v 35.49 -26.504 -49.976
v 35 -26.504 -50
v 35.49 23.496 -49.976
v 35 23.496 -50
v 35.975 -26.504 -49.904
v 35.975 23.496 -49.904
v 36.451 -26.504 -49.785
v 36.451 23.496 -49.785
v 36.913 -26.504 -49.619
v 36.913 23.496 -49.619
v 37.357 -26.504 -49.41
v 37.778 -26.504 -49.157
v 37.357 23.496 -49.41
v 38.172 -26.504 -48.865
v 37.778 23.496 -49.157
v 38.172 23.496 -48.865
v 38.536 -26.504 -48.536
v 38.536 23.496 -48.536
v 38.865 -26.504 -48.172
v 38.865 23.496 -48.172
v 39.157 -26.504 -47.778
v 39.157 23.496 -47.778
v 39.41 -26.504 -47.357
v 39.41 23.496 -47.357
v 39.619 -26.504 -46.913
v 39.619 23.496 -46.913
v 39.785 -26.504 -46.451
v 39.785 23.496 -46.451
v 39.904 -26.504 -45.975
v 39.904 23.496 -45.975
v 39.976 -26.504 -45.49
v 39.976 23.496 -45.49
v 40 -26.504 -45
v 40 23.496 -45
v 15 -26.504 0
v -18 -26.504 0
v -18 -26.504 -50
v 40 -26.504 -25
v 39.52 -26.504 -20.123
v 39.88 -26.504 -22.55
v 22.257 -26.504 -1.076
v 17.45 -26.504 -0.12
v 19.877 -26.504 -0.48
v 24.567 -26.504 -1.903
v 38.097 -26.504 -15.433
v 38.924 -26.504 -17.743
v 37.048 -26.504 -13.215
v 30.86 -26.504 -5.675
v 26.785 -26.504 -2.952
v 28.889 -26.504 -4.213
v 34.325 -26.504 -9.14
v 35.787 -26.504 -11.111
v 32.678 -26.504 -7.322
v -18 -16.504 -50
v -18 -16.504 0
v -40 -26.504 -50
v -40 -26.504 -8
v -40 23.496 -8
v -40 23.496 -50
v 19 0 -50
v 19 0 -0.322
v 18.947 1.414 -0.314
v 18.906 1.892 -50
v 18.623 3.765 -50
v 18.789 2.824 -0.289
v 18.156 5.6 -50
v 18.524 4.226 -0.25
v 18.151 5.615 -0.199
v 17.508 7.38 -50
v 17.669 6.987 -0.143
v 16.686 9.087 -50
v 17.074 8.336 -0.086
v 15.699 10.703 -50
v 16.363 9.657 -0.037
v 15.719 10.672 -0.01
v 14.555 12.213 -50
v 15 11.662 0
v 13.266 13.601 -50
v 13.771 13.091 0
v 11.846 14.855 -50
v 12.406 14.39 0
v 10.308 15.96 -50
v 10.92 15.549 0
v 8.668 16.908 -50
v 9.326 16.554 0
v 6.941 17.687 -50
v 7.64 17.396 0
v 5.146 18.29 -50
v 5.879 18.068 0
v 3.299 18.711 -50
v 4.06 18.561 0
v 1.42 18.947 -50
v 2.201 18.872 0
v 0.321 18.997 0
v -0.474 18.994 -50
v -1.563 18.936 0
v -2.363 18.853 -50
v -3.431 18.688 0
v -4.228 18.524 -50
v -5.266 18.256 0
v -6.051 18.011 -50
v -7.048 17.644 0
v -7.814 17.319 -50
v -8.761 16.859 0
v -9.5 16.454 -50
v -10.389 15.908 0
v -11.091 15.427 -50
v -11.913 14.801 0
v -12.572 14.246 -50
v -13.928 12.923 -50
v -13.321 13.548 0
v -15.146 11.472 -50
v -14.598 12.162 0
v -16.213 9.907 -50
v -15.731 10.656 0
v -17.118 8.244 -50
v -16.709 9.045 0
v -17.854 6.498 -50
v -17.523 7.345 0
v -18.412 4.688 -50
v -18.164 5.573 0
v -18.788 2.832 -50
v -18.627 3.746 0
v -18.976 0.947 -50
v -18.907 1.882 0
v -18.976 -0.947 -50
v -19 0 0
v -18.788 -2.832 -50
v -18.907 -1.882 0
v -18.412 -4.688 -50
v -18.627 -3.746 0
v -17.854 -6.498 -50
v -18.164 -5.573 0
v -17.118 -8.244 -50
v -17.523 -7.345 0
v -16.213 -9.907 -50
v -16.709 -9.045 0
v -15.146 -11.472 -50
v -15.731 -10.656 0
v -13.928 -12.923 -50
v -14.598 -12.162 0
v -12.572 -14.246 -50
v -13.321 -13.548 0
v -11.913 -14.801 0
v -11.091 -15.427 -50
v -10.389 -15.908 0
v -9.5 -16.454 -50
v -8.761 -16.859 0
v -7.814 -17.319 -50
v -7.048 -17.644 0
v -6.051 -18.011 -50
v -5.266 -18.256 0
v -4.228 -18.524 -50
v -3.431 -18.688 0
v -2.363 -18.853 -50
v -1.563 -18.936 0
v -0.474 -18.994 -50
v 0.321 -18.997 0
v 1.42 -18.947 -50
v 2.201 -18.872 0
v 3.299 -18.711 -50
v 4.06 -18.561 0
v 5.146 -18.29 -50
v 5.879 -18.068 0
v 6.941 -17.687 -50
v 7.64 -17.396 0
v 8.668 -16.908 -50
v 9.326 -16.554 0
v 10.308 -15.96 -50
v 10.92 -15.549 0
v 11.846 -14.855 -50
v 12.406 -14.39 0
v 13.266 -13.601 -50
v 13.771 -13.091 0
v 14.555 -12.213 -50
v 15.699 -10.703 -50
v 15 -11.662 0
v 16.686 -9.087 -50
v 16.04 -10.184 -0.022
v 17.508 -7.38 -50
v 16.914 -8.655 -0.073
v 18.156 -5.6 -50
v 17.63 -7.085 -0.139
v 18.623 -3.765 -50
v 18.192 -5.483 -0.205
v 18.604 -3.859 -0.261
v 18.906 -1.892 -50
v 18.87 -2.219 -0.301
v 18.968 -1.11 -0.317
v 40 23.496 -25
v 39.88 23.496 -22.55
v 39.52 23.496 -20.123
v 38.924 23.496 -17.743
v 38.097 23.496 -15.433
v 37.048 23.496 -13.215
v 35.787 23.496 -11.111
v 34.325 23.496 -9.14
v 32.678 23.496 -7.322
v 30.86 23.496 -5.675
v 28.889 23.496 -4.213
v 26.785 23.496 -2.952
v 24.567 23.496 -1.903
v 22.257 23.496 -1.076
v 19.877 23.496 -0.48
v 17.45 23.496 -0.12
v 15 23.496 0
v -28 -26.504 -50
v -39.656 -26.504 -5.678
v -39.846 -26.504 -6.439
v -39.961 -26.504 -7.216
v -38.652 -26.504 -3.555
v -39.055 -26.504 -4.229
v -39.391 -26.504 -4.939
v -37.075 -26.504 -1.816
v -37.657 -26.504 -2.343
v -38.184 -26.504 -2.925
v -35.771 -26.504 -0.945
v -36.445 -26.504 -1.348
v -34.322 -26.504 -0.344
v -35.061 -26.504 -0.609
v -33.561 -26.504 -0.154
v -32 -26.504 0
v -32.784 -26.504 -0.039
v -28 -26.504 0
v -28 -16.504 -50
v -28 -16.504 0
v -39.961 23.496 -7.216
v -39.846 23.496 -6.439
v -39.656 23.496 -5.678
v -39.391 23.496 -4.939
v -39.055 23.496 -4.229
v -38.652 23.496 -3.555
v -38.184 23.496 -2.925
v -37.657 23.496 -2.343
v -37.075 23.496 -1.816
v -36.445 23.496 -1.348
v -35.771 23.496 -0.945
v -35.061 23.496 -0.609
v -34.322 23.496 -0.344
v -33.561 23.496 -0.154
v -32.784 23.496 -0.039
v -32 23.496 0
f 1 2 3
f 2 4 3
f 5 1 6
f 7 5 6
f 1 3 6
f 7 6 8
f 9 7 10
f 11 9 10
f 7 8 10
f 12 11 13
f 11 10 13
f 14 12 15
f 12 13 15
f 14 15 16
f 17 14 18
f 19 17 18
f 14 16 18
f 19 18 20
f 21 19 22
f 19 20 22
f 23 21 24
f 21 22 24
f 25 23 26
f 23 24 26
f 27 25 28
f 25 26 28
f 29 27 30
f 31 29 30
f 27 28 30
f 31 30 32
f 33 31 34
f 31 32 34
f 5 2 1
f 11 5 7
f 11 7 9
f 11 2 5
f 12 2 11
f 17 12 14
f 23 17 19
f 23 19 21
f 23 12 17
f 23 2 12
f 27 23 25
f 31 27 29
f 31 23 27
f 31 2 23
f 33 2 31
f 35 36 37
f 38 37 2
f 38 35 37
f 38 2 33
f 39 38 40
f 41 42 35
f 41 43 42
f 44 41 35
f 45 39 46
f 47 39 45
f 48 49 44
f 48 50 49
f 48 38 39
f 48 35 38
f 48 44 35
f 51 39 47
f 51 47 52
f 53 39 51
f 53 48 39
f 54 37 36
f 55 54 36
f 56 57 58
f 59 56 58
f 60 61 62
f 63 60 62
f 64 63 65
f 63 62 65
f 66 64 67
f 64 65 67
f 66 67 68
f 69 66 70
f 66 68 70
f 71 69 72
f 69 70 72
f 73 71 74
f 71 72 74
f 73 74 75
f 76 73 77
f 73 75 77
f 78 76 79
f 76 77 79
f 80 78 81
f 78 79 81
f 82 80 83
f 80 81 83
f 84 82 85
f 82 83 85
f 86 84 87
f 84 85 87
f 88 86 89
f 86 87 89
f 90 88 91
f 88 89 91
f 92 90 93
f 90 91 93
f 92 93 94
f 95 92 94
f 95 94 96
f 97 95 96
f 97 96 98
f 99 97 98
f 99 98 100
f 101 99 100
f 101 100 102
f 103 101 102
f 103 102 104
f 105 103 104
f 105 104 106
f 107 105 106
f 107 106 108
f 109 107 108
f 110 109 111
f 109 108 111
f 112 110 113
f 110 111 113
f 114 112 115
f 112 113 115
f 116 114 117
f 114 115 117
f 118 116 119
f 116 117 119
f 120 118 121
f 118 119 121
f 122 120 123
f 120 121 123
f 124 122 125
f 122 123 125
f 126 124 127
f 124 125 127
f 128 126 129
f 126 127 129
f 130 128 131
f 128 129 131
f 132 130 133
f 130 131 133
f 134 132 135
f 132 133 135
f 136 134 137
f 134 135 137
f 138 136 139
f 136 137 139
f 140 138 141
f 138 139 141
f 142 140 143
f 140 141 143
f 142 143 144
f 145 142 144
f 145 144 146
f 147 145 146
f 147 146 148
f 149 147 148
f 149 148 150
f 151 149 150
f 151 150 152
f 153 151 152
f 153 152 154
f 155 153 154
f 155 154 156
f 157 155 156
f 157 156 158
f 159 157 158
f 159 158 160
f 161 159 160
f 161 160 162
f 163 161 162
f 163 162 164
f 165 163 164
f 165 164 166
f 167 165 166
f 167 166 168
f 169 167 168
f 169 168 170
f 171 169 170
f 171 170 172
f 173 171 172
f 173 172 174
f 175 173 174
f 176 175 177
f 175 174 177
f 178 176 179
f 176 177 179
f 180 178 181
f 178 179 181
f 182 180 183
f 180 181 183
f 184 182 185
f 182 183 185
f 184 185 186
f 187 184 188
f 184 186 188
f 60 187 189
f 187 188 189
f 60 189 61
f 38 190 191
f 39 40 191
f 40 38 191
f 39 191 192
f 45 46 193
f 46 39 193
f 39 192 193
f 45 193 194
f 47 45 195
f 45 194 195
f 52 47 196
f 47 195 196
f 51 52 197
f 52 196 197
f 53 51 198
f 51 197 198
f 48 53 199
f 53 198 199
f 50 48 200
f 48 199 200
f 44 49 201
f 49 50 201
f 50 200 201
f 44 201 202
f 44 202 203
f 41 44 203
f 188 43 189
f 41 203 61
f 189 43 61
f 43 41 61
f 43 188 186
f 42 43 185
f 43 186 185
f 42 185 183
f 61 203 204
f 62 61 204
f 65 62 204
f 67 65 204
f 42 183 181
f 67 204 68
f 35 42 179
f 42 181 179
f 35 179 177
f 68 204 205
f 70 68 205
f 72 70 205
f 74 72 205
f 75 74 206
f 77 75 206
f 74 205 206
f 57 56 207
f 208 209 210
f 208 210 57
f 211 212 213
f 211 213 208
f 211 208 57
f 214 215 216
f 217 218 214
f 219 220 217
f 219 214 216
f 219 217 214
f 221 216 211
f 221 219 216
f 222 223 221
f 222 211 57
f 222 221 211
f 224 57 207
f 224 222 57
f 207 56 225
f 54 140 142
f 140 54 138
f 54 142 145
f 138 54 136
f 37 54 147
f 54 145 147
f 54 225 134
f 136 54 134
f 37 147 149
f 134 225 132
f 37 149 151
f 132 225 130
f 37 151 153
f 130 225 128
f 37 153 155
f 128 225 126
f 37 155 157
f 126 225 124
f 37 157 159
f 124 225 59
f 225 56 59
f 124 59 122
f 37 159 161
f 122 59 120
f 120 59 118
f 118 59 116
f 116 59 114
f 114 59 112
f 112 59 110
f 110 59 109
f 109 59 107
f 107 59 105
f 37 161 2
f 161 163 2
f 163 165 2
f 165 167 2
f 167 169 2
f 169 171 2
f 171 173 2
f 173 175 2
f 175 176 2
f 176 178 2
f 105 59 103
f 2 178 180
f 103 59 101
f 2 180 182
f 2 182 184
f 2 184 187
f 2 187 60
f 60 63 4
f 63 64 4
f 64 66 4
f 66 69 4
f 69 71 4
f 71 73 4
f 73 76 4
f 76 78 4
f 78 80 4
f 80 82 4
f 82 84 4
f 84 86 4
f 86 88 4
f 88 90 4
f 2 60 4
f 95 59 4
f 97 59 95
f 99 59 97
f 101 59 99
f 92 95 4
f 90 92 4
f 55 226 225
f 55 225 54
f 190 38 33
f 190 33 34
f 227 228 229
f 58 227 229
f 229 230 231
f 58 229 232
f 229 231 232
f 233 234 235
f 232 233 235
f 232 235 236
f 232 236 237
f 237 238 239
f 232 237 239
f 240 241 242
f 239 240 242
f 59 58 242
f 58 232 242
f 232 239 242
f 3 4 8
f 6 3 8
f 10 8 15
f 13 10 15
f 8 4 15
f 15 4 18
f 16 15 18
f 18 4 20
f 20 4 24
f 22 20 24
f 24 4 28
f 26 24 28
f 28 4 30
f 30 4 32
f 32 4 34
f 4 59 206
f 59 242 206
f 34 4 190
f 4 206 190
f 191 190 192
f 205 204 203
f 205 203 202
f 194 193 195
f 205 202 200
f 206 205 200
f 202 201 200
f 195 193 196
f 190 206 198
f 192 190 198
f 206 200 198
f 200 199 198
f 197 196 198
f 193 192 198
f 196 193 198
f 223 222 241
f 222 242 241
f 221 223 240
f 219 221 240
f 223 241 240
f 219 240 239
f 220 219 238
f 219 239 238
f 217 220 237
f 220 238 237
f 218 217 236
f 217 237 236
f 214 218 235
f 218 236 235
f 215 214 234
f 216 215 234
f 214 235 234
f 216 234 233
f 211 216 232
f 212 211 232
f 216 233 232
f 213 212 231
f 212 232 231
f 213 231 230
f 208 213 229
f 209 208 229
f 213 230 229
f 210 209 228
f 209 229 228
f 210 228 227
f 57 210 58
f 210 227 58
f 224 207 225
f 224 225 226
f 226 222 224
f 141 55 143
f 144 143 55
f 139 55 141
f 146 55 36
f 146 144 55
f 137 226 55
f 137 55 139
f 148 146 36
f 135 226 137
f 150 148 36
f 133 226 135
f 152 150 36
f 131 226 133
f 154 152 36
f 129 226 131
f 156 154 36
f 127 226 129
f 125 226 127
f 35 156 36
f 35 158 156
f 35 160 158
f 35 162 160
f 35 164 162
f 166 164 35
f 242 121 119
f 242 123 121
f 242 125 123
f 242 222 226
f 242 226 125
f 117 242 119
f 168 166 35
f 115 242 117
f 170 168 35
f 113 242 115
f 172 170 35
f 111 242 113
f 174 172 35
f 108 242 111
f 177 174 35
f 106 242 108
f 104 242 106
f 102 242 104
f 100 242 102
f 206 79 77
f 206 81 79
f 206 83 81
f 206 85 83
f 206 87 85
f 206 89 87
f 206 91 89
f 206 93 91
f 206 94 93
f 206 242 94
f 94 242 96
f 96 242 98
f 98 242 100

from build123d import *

# Parameters (mm, degrees)
F0_W        = 80
F0_H        = 50
F0_R        = 19
F1_DEPTH    = 50
F2_T1_DEPTH = 175
F3_R        = 5
F4_R        = 8
F5_W        = 10
F5_H        = 50
F6_DEPTH    = 10


# Not quite as in the source:
# - a fillet or chamfer that OpenCascade refuses, or shapes differently, is made with other operations: its cross-section is extruded or revolved along the edge and cut away or added


with BuildPart() as f1:
    # F0 (on Top) → F1 (new body)
    with BuildSketch(Plane.XY):
        with Locations((0, -1.5042735598)):
            Rectangle(F0_W, F0_H)
        Circle(F0_R, mode=Mode.SUBTRACT)
    extrude(amount=-F1_DEPTH)

    # F2: fillet of radius 25 on 1 edges, made by hand

    # F2_s2 → F2_t1 (cut)
    with BuildSketch(Plane.XZ.offset(-85.9957264402)):
        with BuildLine():
            ThreePointArc((40, -25), (32.6776695297, -7.3223304703), (15, 0))
            Line((15, 0), (40, 0))
            Line((40, 0), (40, -25))
        make_face()
    extrude(amount=F2_T1_DEPTH, mode=Mode.SUBTRACT)

    # F3
    f3_edges = [f1.edges().sort_by_distance(p)[0] for p in [
        (40, -1.504274, -50),
    ]]
    fillet(f3_edges, radius=F3_R)

    # F4
    f4_edges = [f1.edges().sort_by_distance(p)[0] for p in [
        (-40, -1.504274, 0),
    ]]
    fillet(f4_edges, radius=F4_R)

    # F5 (on face) → F6 (cut)
    with BuildSketch(Plane.XZ.offset(26.5042735598)):
        with Locations((-23, -25)):
            Rectangle(F5_W, F5_H)
    extrude(amount=-F6_DEPTH, mode=Mode.SUBTRACT)


solid = f1.part
